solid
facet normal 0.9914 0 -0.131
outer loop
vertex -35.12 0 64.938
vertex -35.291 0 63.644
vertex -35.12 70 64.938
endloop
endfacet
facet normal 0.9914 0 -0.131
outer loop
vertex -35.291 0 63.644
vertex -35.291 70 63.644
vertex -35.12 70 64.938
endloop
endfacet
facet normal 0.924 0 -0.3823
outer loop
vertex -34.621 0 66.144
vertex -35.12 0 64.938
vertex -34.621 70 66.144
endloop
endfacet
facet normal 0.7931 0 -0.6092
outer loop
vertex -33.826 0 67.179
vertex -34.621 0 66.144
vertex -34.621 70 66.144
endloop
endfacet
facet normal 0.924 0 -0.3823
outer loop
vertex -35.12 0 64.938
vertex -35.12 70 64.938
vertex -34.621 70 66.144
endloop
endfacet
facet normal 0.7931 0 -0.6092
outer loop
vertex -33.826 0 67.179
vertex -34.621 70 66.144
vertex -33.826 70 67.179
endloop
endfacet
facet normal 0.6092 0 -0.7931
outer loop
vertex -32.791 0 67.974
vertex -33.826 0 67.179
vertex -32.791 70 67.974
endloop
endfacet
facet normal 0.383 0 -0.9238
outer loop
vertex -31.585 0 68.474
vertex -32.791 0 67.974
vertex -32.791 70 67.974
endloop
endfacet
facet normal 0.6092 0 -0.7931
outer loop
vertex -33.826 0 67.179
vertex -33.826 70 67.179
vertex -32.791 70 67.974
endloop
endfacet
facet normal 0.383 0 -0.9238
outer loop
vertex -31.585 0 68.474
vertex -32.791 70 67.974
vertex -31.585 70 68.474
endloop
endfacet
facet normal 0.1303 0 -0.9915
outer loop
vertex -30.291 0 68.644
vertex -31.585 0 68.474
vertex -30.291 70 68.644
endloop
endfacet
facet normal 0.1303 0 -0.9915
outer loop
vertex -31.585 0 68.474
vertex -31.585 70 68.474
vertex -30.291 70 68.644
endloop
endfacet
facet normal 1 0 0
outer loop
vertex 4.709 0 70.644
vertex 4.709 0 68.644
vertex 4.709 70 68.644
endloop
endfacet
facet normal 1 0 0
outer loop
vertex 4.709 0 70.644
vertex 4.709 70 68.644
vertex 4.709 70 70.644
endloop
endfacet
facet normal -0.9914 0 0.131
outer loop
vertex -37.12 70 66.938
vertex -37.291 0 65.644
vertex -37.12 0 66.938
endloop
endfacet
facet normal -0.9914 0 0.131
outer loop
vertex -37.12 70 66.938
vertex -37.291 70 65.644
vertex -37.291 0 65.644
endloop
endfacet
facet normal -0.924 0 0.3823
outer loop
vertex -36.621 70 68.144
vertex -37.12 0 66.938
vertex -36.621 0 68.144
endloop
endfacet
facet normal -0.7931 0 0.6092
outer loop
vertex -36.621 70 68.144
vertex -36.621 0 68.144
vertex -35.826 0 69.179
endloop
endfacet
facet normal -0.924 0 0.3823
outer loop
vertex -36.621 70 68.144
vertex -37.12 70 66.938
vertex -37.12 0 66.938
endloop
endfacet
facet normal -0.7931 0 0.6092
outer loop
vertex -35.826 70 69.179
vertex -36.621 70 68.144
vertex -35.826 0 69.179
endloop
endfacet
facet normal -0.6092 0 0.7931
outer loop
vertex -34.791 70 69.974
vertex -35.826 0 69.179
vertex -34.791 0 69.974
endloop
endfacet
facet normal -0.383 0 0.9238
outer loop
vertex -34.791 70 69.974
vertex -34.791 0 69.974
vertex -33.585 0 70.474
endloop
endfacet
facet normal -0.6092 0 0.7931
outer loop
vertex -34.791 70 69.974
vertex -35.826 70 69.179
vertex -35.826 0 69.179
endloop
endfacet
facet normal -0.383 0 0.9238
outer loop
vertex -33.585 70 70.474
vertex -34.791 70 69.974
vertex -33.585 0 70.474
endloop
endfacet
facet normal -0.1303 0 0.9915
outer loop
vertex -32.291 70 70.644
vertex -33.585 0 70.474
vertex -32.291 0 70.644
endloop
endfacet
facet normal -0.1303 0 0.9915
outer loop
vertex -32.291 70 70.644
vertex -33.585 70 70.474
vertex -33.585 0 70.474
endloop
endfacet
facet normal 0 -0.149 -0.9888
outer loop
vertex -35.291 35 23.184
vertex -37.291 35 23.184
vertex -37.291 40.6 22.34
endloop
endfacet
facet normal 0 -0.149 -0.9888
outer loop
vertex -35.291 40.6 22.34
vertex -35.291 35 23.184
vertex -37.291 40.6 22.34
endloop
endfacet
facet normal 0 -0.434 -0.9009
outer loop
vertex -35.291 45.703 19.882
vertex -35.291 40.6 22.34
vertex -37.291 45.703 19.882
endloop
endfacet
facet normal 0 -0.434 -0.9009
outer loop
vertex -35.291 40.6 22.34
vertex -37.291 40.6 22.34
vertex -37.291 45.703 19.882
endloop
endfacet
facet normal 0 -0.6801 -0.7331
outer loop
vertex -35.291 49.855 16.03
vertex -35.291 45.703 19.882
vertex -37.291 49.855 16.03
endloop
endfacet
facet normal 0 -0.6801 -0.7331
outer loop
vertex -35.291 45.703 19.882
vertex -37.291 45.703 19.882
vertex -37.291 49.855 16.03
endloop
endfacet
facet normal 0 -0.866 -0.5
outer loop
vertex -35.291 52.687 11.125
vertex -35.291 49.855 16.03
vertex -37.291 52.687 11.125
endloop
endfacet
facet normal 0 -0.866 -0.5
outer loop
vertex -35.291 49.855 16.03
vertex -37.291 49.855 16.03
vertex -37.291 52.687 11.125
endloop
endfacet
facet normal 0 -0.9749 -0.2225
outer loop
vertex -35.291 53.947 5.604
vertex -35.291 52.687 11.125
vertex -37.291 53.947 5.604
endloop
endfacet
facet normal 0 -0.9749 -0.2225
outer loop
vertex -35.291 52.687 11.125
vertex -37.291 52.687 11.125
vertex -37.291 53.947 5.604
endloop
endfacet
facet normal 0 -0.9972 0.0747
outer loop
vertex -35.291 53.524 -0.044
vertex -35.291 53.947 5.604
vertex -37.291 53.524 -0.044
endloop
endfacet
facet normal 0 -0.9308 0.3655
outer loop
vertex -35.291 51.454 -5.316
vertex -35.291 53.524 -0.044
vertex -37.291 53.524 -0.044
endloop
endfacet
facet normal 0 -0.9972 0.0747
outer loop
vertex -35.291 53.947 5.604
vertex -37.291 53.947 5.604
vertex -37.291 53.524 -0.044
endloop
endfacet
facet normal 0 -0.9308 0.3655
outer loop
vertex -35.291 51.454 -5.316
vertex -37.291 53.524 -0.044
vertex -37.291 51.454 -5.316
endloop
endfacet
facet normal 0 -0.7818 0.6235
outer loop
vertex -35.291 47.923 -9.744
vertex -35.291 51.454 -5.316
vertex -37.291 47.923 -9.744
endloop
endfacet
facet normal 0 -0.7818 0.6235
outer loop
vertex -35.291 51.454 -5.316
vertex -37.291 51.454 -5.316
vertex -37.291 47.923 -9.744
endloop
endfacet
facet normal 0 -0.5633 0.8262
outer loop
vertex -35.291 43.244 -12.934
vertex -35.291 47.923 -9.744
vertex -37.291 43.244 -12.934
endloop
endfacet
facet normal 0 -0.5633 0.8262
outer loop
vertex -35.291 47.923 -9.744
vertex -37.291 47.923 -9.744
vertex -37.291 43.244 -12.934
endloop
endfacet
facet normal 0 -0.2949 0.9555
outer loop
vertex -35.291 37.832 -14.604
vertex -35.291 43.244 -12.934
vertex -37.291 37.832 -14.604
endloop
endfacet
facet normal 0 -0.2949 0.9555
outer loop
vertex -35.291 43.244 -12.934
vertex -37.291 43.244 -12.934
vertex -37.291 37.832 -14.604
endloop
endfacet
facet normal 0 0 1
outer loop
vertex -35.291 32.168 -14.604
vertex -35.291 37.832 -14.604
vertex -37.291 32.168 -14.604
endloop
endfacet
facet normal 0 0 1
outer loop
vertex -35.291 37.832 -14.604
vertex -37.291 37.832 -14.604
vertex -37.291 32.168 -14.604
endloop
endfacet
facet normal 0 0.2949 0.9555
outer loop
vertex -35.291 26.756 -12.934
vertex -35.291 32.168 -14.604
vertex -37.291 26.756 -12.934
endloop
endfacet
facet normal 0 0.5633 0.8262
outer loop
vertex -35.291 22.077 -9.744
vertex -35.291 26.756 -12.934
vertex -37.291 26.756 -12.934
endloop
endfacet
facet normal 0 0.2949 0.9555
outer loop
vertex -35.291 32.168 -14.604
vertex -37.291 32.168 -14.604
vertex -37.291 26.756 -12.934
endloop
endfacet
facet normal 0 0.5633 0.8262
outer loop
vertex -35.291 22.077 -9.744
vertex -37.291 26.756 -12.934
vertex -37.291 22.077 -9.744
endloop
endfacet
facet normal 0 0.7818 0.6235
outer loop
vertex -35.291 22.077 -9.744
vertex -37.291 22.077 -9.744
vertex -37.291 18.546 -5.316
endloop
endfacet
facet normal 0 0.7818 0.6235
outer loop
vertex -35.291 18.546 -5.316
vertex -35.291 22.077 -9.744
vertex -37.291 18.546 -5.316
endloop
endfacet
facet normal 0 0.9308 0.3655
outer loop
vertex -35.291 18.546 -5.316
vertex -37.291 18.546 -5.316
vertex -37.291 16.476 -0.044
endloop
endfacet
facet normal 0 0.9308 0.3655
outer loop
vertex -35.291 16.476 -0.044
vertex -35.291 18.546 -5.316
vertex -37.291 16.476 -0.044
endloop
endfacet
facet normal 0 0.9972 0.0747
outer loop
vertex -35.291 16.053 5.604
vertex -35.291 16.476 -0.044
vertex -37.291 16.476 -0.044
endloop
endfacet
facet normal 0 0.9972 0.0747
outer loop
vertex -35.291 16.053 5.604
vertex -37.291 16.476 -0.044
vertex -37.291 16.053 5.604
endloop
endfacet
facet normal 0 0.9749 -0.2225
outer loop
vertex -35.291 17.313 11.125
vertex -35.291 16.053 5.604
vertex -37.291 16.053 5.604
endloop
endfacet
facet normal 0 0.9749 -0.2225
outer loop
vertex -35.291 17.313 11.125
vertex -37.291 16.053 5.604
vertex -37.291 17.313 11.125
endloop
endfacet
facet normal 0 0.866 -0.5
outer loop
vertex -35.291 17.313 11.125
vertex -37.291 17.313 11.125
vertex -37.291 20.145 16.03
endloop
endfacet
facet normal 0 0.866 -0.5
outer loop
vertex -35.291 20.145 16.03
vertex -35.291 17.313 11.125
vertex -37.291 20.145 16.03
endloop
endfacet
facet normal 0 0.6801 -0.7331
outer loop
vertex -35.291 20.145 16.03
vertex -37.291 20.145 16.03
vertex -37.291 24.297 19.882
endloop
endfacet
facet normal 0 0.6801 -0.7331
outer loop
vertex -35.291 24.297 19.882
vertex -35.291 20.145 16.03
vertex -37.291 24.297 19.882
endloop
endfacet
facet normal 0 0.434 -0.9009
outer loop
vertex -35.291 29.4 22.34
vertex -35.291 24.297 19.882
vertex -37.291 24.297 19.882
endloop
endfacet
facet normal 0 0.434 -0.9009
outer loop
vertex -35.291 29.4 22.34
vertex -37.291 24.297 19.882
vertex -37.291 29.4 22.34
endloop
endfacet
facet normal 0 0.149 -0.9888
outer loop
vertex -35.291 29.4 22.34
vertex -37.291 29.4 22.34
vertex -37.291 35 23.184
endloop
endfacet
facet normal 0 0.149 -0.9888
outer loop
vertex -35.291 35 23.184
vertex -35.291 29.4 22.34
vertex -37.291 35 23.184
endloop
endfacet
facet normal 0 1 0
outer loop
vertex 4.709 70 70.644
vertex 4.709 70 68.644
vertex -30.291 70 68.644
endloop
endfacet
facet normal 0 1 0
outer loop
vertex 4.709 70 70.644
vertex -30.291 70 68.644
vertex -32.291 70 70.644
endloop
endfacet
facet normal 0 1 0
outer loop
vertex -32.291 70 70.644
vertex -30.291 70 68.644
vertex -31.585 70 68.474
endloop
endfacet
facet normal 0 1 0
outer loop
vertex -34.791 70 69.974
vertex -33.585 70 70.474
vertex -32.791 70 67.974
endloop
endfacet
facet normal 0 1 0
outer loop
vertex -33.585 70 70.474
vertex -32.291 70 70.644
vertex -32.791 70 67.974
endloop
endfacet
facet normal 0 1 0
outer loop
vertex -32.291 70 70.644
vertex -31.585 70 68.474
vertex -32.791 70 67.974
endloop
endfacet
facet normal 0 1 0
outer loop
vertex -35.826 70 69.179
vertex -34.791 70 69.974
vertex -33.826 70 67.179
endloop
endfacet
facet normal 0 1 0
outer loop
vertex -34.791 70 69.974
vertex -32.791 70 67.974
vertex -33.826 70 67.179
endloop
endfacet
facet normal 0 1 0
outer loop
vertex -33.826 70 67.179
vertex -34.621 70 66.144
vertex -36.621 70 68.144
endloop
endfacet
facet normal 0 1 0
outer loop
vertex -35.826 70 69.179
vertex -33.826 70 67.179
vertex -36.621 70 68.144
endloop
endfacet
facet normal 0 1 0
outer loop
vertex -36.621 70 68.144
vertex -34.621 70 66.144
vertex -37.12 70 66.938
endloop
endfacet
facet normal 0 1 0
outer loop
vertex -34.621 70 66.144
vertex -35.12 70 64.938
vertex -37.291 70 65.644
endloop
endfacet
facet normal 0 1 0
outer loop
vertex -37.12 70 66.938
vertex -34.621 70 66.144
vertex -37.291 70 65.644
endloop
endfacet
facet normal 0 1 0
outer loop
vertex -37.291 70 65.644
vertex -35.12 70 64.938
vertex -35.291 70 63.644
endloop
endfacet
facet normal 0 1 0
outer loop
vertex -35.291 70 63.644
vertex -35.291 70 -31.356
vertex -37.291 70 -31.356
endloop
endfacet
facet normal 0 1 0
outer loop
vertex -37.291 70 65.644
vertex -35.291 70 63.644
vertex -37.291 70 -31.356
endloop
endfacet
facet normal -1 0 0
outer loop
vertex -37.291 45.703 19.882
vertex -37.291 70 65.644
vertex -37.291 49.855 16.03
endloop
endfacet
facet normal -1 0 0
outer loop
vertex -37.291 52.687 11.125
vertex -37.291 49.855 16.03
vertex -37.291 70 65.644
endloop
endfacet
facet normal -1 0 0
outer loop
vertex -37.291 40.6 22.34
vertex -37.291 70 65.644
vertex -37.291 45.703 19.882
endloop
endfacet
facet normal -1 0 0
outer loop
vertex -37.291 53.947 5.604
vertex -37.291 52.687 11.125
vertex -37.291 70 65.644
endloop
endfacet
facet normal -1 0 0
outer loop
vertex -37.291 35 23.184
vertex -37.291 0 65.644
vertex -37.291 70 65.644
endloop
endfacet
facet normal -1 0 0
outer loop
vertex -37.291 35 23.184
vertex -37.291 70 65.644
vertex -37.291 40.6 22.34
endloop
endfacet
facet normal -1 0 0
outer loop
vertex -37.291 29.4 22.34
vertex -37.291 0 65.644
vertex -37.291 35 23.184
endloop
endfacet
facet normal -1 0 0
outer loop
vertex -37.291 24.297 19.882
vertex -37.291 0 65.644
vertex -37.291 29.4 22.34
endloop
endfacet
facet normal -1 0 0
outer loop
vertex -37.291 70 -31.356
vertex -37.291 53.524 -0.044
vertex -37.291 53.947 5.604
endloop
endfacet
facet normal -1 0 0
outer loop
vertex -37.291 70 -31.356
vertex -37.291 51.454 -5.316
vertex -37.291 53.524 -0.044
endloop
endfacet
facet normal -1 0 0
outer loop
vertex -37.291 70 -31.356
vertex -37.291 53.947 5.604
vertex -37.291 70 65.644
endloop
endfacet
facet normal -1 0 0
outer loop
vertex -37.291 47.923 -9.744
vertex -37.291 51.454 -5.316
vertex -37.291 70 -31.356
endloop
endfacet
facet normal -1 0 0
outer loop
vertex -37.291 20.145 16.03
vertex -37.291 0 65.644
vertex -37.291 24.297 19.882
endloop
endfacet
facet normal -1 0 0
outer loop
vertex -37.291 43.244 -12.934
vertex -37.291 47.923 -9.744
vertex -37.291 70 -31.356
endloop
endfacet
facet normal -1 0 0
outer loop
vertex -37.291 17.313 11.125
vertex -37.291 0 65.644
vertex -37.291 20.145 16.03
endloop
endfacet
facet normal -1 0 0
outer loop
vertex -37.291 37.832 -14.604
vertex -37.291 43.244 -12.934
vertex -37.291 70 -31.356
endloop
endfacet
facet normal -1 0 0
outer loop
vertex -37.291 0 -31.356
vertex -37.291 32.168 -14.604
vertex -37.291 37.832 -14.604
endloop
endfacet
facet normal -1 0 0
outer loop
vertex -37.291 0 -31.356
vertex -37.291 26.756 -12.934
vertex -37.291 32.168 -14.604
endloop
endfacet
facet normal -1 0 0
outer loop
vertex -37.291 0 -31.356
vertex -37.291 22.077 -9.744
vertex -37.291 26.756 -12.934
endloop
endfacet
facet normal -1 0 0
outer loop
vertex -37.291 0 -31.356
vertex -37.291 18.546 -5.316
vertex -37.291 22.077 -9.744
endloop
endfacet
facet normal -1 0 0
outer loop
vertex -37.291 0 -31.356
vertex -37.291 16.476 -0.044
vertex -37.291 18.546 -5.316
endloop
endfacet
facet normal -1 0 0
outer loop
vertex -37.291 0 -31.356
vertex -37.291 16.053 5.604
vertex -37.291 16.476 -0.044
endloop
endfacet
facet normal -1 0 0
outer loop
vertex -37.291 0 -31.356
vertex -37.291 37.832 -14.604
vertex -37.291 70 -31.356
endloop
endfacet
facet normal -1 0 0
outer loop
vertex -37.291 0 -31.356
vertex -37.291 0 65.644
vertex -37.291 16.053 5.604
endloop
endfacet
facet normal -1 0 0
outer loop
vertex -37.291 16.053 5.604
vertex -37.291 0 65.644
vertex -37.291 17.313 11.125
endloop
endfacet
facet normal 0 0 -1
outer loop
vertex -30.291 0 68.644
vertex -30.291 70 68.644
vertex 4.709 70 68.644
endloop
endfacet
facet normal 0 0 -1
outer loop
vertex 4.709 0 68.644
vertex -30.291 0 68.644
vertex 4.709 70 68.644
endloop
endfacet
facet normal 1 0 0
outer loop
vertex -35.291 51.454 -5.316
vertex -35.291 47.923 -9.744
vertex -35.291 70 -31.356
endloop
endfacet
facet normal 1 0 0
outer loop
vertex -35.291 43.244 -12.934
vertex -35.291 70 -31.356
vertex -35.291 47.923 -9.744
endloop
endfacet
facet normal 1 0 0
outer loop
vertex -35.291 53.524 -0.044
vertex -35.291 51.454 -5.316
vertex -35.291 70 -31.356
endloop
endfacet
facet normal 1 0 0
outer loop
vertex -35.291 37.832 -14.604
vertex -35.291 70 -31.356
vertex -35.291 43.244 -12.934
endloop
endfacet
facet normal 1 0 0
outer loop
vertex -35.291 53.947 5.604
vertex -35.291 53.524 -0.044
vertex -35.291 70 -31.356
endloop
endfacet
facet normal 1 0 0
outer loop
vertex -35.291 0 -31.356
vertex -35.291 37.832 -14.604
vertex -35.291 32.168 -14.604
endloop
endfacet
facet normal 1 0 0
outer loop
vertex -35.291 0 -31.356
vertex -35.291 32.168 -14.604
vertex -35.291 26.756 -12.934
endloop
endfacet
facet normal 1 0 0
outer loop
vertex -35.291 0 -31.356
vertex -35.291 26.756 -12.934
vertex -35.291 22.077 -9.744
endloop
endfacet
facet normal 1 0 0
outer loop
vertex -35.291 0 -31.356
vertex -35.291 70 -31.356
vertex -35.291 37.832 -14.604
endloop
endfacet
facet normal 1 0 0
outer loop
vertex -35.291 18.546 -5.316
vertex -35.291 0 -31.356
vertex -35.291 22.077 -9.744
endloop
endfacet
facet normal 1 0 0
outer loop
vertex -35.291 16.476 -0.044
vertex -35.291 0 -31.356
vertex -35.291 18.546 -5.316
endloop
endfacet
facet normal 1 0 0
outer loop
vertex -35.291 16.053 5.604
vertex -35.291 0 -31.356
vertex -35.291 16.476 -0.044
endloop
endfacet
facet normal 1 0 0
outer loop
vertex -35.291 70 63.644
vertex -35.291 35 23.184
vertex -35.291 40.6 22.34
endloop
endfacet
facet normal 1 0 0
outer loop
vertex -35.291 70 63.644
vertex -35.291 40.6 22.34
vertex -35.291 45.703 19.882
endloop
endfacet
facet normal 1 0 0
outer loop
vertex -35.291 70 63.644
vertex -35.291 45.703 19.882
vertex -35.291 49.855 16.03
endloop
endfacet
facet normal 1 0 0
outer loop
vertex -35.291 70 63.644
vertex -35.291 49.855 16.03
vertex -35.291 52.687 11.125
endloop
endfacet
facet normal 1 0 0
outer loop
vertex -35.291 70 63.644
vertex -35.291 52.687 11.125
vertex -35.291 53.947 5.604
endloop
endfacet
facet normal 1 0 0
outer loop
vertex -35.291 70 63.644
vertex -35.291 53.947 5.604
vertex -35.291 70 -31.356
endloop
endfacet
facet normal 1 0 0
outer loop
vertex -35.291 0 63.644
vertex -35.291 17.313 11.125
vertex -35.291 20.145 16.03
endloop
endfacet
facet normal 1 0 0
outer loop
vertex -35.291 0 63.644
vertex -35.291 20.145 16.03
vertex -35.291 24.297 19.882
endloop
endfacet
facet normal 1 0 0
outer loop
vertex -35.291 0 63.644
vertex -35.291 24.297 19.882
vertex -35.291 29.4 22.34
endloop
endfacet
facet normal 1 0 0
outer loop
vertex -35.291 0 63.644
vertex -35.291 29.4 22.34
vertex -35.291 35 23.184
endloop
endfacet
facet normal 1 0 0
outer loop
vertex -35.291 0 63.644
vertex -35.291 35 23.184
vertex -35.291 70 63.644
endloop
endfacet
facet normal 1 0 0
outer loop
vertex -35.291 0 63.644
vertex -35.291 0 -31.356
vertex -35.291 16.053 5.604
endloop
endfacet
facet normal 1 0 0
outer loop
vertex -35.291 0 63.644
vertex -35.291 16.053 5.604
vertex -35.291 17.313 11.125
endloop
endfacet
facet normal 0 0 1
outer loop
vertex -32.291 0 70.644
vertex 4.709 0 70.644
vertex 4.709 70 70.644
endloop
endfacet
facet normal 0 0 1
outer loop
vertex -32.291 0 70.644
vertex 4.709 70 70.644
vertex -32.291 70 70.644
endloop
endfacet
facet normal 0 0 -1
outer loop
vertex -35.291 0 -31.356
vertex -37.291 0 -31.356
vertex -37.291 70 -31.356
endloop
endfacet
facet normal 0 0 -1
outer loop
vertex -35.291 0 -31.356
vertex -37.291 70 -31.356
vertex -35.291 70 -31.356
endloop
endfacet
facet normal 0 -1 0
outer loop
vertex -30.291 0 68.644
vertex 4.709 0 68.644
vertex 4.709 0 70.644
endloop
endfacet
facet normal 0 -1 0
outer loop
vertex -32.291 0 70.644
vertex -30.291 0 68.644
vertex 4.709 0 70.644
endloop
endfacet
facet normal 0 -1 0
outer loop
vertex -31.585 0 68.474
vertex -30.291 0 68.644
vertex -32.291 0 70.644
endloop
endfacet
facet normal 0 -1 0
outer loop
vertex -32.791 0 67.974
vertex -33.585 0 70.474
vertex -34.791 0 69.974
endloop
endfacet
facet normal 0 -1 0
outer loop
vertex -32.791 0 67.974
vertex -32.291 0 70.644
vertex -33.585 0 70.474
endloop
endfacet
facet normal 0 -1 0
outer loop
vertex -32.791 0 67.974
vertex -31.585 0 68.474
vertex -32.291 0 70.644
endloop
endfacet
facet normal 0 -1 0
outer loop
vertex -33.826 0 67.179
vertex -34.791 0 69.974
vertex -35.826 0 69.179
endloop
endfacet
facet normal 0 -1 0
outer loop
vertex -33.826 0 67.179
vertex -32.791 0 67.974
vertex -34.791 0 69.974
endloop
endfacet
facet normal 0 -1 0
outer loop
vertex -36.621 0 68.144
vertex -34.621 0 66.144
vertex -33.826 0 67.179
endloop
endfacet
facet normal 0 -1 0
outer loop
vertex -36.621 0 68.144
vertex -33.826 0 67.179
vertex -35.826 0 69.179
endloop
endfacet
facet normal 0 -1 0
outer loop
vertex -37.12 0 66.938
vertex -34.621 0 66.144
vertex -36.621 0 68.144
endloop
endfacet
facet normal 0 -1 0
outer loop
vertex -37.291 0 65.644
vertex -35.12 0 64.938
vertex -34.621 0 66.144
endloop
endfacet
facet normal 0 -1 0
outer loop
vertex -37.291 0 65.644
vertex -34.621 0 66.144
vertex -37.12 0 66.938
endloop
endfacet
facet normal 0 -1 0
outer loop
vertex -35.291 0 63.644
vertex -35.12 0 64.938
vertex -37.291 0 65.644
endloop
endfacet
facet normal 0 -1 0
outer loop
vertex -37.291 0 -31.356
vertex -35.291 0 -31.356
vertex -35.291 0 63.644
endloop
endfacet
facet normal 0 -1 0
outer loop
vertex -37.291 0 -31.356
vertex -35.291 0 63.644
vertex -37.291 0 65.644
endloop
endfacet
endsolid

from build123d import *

# Parameters (mm, degrees)
BOSS_EXTRUDE1_DEPTH = 70
SKETCH2_R           = 19
CUT_EXTRUDE1_DEPTH  = 108.956316041
FILLET1_R           = 5


with BuildPart() as part:
    # Sketch1 → Boss-Extrude1 (new body)
    with BuildSketch(Plane(origin=(0, 0, 0), x_dir=(1, 0, 0), z_dir=(0, 1, 0))):
        Polygon((-37.290686498, 31.356060606), (-35.290686498, 31.356060606), (-35.290686498, -68.643939394), (4.709313502, -68.643939394), (4.709313502, -70.643939394), (-37.290686498, -70.643939394), align=None)
    extrude(amount=BOSS_EXTRUDE1_DEPTH)

    # Sketch2 → Cut-Extrude1 (cut, through all)
    with BuildSketch(Plane.ZY.offset(37.290686498)):
        with Locations((4.183939394, 35)):
            Circle(SKETCH2_R)
    extrude(amount=-CUT_EXTRUDE1_DEPTH, mode=Mode.SUBTRACT)

    # Fillet1
    fillet1_edges = [part.edges().sort_by_distance(p)[0] for p in [
        (-35.290686498, 35, 68.643939394),
        (-37.290686498, 35, 70.643939394),
    ]]
    fillet(fillet1_edges, radius=FILLET1_R)


solid = part.part
